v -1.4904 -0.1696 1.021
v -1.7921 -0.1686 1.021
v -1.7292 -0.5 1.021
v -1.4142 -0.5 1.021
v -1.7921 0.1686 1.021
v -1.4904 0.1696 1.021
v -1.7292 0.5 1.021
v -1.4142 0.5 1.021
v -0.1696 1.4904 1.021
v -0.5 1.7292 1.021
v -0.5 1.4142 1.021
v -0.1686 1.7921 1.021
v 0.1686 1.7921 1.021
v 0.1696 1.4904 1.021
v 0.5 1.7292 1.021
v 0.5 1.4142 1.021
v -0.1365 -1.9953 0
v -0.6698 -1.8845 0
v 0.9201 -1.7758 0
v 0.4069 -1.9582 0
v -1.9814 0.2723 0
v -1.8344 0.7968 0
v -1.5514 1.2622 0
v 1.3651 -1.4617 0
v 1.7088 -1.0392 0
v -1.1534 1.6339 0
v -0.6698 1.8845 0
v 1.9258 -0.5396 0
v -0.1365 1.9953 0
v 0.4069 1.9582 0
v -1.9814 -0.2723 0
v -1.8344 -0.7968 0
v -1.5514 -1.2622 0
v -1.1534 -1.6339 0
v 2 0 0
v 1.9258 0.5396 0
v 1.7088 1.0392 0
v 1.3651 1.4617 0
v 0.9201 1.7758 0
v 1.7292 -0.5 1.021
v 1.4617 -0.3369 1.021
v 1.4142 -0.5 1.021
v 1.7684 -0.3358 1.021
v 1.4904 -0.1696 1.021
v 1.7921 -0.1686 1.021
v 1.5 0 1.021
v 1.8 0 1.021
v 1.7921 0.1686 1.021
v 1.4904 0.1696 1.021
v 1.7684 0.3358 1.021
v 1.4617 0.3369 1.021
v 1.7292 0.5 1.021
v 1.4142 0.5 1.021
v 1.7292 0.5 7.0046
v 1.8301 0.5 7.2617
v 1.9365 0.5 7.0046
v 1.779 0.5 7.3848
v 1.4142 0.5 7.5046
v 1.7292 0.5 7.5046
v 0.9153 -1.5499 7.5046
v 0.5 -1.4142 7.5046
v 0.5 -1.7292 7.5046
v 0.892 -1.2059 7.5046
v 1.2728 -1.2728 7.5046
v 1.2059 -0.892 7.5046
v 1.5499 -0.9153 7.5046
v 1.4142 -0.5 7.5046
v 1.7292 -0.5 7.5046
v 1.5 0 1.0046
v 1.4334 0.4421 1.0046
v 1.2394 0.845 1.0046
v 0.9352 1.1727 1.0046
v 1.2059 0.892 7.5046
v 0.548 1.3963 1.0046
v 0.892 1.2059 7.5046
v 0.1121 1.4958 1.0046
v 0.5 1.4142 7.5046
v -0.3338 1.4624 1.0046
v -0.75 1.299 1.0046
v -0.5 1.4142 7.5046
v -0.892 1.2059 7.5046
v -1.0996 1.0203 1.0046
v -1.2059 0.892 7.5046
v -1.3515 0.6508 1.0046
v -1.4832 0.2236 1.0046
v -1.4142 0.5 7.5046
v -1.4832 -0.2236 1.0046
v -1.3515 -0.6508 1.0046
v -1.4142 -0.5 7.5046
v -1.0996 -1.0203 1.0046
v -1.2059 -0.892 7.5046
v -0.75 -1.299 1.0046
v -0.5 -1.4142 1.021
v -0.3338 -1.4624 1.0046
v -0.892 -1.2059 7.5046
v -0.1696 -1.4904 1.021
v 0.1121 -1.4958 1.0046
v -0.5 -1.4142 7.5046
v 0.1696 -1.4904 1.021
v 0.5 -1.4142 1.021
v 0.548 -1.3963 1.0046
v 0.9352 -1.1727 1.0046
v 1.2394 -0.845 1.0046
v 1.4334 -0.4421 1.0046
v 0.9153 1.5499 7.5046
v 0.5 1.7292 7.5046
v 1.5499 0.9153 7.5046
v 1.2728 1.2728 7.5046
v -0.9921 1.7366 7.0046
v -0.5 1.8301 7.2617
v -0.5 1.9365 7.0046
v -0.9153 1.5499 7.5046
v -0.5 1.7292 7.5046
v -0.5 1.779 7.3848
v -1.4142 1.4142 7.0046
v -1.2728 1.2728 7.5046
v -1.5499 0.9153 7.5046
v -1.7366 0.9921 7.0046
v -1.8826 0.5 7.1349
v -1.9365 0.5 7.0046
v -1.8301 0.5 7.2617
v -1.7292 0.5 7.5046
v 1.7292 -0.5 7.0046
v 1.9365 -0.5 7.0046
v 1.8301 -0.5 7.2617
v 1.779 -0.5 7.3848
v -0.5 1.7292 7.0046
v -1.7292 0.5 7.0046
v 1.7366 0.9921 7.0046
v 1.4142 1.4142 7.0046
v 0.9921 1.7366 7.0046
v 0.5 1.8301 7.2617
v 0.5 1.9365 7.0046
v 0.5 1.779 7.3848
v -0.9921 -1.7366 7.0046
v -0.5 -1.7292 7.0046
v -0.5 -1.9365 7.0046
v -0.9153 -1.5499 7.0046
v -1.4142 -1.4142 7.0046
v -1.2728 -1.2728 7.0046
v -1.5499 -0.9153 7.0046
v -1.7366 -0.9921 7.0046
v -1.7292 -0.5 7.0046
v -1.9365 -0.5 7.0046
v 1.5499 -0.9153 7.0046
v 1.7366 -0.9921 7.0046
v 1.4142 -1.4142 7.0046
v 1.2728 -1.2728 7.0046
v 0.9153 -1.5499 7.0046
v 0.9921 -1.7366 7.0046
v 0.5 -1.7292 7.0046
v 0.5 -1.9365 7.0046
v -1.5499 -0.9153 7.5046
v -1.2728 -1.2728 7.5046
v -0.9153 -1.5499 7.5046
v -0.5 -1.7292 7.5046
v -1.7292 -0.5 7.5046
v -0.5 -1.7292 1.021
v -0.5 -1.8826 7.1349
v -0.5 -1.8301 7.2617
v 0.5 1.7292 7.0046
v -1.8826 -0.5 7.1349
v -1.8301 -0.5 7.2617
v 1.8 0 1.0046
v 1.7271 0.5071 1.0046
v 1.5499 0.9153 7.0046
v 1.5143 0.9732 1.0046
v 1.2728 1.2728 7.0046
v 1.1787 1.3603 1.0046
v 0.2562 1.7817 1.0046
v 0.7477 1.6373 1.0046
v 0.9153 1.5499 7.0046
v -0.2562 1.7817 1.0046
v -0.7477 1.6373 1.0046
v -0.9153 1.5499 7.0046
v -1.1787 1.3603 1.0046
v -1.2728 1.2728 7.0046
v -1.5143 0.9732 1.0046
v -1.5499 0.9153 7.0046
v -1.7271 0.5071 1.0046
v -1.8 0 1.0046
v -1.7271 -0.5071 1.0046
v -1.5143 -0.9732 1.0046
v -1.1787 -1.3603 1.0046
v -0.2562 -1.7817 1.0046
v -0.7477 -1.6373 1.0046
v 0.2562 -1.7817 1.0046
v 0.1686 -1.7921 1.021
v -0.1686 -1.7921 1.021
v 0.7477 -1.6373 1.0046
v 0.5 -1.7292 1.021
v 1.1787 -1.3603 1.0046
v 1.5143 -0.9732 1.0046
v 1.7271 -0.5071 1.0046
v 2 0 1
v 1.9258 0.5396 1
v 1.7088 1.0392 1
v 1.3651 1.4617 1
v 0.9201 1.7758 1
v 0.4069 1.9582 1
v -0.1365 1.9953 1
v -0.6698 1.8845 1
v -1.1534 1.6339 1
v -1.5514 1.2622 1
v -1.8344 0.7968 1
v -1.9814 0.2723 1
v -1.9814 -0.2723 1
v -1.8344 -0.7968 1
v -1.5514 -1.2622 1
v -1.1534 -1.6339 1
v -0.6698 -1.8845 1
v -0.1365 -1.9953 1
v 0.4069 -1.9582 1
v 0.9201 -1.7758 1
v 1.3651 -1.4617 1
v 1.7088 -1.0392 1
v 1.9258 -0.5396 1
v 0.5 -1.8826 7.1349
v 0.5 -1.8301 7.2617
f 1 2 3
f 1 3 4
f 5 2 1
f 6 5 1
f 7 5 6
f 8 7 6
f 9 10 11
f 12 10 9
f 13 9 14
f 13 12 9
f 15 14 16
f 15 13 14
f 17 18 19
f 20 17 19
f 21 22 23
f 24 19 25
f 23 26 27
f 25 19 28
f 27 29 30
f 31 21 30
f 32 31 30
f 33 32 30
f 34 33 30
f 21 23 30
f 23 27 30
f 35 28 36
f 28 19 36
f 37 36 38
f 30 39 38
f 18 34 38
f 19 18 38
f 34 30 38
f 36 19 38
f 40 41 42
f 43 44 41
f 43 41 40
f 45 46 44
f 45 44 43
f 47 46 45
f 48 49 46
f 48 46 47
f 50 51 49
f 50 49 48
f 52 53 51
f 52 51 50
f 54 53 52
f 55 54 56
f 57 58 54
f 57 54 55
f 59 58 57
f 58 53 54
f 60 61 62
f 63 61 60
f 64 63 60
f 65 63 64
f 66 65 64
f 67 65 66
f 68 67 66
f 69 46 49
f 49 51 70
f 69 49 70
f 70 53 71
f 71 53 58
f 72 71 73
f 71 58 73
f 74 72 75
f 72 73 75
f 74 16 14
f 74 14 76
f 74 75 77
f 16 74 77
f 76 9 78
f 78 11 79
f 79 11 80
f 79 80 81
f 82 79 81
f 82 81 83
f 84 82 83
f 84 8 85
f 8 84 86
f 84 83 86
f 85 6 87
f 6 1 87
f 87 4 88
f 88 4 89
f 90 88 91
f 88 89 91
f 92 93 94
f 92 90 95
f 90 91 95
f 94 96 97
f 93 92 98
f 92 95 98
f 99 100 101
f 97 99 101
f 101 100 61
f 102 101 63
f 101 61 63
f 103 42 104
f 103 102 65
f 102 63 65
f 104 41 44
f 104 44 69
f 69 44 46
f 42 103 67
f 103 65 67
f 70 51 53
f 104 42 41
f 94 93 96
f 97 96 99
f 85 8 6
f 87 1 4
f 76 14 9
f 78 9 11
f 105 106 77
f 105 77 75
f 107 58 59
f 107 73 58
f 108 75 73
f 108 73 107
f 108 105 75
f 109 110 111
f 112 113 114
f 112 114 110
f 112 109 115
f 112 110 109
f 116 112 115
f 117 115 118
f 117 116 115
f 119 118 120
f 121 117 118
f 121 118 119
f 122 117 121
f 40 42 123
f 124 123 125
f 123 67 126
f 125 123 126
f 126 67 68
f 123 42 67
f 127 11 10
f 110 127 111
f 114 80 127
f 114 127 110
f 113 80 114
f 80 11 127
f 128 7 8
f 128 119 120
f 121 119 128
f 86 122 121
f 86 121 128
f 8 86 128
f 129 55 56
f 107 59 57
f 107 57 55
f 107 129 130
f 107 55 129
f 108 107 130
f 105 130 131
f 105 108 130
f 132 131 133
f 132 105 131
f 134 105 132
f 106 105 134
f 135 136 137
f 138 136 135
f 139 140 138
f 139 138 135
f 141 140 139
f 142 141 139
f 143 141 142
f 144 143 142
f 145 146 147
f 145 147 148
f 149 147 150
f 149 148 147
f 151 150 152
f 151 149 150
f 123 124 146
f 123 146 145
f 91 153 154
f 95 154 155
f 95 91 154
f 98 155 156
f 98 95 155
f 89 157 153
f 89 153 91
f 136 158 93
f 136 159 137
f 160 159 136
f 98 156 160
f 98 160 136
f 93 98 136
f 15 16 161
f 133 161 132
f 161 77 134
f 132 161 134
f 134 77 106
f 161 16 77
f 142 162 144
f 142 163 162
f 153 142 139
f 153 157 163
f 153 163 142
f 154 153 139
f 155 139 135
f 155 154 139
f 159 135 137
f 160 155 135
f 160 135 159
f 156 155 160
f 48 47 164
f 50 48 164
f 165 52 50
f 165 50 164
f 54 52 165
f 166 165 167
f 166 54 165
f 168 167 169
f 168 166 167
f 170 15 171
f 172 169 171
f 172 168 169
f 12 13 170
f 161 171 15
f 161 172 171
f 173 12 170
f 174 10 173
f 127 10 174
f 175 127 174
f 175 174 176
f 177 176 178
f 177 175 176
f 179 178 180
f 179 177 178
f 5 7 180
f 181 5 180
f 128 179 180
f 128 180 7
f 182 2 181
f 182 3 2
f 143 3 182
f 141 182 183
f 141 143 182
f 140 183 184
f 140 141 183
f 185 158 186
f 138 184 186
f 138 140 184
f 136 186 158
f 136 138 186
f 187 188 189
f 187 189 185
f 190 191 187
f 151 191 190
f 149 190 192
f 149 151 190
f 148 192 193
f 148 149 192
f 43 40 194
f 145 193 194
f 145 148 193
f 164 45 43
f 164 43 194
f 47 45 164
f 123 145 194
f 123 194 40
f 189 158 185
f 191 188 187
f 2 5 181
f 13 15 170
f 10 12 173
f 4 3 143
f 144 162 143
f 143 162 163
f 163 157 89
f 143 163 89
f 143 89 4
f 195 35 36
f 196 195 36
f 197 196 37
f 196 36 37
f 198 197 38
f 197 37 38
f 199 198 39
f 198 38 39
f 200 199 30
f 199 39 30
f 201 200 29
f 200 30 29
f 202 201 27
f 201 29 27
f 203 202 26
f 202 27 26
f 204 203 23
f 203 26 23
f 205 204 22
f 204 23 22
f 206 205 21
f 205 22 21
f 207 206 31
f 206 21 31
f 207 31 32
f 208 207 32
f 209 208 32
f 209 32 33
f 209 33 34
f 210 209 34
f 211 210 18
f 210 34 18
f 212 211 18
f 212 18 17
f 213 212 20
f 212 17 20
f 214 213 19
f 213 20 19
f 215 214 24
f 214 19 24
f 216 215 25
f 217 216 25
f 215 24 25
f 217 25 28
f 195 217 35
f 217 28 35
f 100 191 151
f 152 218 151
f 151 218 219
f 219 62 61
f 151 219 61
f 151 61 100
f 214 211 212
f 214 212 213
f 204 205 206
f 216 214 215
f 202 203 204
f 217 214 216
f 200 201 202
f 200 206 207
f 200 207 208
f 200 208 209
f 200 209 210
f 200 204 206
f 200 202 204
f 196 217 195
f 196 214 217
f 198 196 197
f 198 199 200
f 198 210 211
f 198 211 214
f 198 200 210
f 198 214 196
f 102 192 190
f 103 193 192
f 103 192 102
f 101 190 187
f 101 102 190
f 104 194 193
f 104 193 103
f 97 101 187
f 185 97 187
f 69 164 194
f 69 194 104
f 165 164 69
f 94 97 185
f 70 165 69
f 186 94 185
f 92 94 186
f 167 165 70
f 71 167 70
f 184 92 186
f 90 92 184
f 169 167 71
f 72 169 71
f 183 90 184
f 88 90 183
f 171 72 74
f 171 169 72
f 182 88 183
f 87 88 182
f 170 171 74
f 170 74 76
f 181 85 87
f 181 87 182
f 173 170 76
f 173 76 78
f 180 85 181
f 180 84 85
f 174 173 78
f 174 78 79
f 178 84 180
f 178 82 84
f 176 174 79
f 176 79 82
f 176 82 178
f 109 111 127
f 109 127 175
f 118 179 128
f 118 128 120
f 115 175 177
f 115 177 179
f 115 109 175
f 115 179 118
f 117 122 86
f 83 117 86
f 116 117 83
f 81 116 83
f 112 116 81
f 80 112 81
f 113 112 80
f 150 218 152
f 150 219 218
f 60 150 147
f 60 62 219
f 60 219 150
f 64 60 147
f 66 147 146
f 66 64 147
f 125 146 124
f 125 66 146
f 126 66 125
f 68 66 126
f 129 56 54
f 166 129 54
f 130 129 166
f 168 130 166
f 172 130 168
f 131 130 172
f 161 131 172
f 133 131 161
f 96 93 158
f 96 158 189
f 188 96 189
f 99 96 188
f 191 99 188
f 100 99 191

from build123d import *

# Parameters (mm, degrees)
F0_R     = 2
F1_DEPTH = 1
F4_R     = 1.5
F5_DEPTH = 6.5
F7_W     = 2
F7_H     = 1
F7_W_2   = 1
F7_H_2   = 2
F8_DEPTH = 6.5


with BuildPart() as f1:
    # F0 (on Top) → F1 (new body)
    with BuildSketch(Plane.XY):
        Circle(F0_R)
    extrude(amount=F1_DEPTH)


with BuildPart() as f3:
    # F2 (on Front) → F3 (revolve)
    with BuildSketch(Plane.XZ):
        Polygon((1.8, 7.504579), (0, 7.504579), (0, 1.004579), (1.8, 1.004579), (1.8, 7.004579), (2, 7.004579), align=None)
    revolve(axis=Axis((0, 0, 0), (0, 0, 1)))

    # F4 (on face) → F5 (cut)
    with BuildSketch(Plane.XY.offset(7.504579)):
        Circle(F4_R)
    extrude(amount=-F5_DEPTH, mode=Mode.SUBTRACT)

    # F7 (on offset) → F8 (cut)
    with BuildSketch(Plane.XY.offset(7.521)):
        with Locations((-1.5, 0)):
            Rectangle(F7_W, F7_H)
        with Locations((0, 1.5)):
            Rectangle(F7_W_2, F7_H_2)
        with Locations((1.5, 0)):
            Rectangle(F7_W, F7_H)
        with Locations((0, -1.5)):
            Rectangle(F7_W_2, F7_H_2)
    extrude(amount=-F8_DEPTH, mode=Mode.SUBTRACT)


solid = Compound([f1.part, f3.part])
